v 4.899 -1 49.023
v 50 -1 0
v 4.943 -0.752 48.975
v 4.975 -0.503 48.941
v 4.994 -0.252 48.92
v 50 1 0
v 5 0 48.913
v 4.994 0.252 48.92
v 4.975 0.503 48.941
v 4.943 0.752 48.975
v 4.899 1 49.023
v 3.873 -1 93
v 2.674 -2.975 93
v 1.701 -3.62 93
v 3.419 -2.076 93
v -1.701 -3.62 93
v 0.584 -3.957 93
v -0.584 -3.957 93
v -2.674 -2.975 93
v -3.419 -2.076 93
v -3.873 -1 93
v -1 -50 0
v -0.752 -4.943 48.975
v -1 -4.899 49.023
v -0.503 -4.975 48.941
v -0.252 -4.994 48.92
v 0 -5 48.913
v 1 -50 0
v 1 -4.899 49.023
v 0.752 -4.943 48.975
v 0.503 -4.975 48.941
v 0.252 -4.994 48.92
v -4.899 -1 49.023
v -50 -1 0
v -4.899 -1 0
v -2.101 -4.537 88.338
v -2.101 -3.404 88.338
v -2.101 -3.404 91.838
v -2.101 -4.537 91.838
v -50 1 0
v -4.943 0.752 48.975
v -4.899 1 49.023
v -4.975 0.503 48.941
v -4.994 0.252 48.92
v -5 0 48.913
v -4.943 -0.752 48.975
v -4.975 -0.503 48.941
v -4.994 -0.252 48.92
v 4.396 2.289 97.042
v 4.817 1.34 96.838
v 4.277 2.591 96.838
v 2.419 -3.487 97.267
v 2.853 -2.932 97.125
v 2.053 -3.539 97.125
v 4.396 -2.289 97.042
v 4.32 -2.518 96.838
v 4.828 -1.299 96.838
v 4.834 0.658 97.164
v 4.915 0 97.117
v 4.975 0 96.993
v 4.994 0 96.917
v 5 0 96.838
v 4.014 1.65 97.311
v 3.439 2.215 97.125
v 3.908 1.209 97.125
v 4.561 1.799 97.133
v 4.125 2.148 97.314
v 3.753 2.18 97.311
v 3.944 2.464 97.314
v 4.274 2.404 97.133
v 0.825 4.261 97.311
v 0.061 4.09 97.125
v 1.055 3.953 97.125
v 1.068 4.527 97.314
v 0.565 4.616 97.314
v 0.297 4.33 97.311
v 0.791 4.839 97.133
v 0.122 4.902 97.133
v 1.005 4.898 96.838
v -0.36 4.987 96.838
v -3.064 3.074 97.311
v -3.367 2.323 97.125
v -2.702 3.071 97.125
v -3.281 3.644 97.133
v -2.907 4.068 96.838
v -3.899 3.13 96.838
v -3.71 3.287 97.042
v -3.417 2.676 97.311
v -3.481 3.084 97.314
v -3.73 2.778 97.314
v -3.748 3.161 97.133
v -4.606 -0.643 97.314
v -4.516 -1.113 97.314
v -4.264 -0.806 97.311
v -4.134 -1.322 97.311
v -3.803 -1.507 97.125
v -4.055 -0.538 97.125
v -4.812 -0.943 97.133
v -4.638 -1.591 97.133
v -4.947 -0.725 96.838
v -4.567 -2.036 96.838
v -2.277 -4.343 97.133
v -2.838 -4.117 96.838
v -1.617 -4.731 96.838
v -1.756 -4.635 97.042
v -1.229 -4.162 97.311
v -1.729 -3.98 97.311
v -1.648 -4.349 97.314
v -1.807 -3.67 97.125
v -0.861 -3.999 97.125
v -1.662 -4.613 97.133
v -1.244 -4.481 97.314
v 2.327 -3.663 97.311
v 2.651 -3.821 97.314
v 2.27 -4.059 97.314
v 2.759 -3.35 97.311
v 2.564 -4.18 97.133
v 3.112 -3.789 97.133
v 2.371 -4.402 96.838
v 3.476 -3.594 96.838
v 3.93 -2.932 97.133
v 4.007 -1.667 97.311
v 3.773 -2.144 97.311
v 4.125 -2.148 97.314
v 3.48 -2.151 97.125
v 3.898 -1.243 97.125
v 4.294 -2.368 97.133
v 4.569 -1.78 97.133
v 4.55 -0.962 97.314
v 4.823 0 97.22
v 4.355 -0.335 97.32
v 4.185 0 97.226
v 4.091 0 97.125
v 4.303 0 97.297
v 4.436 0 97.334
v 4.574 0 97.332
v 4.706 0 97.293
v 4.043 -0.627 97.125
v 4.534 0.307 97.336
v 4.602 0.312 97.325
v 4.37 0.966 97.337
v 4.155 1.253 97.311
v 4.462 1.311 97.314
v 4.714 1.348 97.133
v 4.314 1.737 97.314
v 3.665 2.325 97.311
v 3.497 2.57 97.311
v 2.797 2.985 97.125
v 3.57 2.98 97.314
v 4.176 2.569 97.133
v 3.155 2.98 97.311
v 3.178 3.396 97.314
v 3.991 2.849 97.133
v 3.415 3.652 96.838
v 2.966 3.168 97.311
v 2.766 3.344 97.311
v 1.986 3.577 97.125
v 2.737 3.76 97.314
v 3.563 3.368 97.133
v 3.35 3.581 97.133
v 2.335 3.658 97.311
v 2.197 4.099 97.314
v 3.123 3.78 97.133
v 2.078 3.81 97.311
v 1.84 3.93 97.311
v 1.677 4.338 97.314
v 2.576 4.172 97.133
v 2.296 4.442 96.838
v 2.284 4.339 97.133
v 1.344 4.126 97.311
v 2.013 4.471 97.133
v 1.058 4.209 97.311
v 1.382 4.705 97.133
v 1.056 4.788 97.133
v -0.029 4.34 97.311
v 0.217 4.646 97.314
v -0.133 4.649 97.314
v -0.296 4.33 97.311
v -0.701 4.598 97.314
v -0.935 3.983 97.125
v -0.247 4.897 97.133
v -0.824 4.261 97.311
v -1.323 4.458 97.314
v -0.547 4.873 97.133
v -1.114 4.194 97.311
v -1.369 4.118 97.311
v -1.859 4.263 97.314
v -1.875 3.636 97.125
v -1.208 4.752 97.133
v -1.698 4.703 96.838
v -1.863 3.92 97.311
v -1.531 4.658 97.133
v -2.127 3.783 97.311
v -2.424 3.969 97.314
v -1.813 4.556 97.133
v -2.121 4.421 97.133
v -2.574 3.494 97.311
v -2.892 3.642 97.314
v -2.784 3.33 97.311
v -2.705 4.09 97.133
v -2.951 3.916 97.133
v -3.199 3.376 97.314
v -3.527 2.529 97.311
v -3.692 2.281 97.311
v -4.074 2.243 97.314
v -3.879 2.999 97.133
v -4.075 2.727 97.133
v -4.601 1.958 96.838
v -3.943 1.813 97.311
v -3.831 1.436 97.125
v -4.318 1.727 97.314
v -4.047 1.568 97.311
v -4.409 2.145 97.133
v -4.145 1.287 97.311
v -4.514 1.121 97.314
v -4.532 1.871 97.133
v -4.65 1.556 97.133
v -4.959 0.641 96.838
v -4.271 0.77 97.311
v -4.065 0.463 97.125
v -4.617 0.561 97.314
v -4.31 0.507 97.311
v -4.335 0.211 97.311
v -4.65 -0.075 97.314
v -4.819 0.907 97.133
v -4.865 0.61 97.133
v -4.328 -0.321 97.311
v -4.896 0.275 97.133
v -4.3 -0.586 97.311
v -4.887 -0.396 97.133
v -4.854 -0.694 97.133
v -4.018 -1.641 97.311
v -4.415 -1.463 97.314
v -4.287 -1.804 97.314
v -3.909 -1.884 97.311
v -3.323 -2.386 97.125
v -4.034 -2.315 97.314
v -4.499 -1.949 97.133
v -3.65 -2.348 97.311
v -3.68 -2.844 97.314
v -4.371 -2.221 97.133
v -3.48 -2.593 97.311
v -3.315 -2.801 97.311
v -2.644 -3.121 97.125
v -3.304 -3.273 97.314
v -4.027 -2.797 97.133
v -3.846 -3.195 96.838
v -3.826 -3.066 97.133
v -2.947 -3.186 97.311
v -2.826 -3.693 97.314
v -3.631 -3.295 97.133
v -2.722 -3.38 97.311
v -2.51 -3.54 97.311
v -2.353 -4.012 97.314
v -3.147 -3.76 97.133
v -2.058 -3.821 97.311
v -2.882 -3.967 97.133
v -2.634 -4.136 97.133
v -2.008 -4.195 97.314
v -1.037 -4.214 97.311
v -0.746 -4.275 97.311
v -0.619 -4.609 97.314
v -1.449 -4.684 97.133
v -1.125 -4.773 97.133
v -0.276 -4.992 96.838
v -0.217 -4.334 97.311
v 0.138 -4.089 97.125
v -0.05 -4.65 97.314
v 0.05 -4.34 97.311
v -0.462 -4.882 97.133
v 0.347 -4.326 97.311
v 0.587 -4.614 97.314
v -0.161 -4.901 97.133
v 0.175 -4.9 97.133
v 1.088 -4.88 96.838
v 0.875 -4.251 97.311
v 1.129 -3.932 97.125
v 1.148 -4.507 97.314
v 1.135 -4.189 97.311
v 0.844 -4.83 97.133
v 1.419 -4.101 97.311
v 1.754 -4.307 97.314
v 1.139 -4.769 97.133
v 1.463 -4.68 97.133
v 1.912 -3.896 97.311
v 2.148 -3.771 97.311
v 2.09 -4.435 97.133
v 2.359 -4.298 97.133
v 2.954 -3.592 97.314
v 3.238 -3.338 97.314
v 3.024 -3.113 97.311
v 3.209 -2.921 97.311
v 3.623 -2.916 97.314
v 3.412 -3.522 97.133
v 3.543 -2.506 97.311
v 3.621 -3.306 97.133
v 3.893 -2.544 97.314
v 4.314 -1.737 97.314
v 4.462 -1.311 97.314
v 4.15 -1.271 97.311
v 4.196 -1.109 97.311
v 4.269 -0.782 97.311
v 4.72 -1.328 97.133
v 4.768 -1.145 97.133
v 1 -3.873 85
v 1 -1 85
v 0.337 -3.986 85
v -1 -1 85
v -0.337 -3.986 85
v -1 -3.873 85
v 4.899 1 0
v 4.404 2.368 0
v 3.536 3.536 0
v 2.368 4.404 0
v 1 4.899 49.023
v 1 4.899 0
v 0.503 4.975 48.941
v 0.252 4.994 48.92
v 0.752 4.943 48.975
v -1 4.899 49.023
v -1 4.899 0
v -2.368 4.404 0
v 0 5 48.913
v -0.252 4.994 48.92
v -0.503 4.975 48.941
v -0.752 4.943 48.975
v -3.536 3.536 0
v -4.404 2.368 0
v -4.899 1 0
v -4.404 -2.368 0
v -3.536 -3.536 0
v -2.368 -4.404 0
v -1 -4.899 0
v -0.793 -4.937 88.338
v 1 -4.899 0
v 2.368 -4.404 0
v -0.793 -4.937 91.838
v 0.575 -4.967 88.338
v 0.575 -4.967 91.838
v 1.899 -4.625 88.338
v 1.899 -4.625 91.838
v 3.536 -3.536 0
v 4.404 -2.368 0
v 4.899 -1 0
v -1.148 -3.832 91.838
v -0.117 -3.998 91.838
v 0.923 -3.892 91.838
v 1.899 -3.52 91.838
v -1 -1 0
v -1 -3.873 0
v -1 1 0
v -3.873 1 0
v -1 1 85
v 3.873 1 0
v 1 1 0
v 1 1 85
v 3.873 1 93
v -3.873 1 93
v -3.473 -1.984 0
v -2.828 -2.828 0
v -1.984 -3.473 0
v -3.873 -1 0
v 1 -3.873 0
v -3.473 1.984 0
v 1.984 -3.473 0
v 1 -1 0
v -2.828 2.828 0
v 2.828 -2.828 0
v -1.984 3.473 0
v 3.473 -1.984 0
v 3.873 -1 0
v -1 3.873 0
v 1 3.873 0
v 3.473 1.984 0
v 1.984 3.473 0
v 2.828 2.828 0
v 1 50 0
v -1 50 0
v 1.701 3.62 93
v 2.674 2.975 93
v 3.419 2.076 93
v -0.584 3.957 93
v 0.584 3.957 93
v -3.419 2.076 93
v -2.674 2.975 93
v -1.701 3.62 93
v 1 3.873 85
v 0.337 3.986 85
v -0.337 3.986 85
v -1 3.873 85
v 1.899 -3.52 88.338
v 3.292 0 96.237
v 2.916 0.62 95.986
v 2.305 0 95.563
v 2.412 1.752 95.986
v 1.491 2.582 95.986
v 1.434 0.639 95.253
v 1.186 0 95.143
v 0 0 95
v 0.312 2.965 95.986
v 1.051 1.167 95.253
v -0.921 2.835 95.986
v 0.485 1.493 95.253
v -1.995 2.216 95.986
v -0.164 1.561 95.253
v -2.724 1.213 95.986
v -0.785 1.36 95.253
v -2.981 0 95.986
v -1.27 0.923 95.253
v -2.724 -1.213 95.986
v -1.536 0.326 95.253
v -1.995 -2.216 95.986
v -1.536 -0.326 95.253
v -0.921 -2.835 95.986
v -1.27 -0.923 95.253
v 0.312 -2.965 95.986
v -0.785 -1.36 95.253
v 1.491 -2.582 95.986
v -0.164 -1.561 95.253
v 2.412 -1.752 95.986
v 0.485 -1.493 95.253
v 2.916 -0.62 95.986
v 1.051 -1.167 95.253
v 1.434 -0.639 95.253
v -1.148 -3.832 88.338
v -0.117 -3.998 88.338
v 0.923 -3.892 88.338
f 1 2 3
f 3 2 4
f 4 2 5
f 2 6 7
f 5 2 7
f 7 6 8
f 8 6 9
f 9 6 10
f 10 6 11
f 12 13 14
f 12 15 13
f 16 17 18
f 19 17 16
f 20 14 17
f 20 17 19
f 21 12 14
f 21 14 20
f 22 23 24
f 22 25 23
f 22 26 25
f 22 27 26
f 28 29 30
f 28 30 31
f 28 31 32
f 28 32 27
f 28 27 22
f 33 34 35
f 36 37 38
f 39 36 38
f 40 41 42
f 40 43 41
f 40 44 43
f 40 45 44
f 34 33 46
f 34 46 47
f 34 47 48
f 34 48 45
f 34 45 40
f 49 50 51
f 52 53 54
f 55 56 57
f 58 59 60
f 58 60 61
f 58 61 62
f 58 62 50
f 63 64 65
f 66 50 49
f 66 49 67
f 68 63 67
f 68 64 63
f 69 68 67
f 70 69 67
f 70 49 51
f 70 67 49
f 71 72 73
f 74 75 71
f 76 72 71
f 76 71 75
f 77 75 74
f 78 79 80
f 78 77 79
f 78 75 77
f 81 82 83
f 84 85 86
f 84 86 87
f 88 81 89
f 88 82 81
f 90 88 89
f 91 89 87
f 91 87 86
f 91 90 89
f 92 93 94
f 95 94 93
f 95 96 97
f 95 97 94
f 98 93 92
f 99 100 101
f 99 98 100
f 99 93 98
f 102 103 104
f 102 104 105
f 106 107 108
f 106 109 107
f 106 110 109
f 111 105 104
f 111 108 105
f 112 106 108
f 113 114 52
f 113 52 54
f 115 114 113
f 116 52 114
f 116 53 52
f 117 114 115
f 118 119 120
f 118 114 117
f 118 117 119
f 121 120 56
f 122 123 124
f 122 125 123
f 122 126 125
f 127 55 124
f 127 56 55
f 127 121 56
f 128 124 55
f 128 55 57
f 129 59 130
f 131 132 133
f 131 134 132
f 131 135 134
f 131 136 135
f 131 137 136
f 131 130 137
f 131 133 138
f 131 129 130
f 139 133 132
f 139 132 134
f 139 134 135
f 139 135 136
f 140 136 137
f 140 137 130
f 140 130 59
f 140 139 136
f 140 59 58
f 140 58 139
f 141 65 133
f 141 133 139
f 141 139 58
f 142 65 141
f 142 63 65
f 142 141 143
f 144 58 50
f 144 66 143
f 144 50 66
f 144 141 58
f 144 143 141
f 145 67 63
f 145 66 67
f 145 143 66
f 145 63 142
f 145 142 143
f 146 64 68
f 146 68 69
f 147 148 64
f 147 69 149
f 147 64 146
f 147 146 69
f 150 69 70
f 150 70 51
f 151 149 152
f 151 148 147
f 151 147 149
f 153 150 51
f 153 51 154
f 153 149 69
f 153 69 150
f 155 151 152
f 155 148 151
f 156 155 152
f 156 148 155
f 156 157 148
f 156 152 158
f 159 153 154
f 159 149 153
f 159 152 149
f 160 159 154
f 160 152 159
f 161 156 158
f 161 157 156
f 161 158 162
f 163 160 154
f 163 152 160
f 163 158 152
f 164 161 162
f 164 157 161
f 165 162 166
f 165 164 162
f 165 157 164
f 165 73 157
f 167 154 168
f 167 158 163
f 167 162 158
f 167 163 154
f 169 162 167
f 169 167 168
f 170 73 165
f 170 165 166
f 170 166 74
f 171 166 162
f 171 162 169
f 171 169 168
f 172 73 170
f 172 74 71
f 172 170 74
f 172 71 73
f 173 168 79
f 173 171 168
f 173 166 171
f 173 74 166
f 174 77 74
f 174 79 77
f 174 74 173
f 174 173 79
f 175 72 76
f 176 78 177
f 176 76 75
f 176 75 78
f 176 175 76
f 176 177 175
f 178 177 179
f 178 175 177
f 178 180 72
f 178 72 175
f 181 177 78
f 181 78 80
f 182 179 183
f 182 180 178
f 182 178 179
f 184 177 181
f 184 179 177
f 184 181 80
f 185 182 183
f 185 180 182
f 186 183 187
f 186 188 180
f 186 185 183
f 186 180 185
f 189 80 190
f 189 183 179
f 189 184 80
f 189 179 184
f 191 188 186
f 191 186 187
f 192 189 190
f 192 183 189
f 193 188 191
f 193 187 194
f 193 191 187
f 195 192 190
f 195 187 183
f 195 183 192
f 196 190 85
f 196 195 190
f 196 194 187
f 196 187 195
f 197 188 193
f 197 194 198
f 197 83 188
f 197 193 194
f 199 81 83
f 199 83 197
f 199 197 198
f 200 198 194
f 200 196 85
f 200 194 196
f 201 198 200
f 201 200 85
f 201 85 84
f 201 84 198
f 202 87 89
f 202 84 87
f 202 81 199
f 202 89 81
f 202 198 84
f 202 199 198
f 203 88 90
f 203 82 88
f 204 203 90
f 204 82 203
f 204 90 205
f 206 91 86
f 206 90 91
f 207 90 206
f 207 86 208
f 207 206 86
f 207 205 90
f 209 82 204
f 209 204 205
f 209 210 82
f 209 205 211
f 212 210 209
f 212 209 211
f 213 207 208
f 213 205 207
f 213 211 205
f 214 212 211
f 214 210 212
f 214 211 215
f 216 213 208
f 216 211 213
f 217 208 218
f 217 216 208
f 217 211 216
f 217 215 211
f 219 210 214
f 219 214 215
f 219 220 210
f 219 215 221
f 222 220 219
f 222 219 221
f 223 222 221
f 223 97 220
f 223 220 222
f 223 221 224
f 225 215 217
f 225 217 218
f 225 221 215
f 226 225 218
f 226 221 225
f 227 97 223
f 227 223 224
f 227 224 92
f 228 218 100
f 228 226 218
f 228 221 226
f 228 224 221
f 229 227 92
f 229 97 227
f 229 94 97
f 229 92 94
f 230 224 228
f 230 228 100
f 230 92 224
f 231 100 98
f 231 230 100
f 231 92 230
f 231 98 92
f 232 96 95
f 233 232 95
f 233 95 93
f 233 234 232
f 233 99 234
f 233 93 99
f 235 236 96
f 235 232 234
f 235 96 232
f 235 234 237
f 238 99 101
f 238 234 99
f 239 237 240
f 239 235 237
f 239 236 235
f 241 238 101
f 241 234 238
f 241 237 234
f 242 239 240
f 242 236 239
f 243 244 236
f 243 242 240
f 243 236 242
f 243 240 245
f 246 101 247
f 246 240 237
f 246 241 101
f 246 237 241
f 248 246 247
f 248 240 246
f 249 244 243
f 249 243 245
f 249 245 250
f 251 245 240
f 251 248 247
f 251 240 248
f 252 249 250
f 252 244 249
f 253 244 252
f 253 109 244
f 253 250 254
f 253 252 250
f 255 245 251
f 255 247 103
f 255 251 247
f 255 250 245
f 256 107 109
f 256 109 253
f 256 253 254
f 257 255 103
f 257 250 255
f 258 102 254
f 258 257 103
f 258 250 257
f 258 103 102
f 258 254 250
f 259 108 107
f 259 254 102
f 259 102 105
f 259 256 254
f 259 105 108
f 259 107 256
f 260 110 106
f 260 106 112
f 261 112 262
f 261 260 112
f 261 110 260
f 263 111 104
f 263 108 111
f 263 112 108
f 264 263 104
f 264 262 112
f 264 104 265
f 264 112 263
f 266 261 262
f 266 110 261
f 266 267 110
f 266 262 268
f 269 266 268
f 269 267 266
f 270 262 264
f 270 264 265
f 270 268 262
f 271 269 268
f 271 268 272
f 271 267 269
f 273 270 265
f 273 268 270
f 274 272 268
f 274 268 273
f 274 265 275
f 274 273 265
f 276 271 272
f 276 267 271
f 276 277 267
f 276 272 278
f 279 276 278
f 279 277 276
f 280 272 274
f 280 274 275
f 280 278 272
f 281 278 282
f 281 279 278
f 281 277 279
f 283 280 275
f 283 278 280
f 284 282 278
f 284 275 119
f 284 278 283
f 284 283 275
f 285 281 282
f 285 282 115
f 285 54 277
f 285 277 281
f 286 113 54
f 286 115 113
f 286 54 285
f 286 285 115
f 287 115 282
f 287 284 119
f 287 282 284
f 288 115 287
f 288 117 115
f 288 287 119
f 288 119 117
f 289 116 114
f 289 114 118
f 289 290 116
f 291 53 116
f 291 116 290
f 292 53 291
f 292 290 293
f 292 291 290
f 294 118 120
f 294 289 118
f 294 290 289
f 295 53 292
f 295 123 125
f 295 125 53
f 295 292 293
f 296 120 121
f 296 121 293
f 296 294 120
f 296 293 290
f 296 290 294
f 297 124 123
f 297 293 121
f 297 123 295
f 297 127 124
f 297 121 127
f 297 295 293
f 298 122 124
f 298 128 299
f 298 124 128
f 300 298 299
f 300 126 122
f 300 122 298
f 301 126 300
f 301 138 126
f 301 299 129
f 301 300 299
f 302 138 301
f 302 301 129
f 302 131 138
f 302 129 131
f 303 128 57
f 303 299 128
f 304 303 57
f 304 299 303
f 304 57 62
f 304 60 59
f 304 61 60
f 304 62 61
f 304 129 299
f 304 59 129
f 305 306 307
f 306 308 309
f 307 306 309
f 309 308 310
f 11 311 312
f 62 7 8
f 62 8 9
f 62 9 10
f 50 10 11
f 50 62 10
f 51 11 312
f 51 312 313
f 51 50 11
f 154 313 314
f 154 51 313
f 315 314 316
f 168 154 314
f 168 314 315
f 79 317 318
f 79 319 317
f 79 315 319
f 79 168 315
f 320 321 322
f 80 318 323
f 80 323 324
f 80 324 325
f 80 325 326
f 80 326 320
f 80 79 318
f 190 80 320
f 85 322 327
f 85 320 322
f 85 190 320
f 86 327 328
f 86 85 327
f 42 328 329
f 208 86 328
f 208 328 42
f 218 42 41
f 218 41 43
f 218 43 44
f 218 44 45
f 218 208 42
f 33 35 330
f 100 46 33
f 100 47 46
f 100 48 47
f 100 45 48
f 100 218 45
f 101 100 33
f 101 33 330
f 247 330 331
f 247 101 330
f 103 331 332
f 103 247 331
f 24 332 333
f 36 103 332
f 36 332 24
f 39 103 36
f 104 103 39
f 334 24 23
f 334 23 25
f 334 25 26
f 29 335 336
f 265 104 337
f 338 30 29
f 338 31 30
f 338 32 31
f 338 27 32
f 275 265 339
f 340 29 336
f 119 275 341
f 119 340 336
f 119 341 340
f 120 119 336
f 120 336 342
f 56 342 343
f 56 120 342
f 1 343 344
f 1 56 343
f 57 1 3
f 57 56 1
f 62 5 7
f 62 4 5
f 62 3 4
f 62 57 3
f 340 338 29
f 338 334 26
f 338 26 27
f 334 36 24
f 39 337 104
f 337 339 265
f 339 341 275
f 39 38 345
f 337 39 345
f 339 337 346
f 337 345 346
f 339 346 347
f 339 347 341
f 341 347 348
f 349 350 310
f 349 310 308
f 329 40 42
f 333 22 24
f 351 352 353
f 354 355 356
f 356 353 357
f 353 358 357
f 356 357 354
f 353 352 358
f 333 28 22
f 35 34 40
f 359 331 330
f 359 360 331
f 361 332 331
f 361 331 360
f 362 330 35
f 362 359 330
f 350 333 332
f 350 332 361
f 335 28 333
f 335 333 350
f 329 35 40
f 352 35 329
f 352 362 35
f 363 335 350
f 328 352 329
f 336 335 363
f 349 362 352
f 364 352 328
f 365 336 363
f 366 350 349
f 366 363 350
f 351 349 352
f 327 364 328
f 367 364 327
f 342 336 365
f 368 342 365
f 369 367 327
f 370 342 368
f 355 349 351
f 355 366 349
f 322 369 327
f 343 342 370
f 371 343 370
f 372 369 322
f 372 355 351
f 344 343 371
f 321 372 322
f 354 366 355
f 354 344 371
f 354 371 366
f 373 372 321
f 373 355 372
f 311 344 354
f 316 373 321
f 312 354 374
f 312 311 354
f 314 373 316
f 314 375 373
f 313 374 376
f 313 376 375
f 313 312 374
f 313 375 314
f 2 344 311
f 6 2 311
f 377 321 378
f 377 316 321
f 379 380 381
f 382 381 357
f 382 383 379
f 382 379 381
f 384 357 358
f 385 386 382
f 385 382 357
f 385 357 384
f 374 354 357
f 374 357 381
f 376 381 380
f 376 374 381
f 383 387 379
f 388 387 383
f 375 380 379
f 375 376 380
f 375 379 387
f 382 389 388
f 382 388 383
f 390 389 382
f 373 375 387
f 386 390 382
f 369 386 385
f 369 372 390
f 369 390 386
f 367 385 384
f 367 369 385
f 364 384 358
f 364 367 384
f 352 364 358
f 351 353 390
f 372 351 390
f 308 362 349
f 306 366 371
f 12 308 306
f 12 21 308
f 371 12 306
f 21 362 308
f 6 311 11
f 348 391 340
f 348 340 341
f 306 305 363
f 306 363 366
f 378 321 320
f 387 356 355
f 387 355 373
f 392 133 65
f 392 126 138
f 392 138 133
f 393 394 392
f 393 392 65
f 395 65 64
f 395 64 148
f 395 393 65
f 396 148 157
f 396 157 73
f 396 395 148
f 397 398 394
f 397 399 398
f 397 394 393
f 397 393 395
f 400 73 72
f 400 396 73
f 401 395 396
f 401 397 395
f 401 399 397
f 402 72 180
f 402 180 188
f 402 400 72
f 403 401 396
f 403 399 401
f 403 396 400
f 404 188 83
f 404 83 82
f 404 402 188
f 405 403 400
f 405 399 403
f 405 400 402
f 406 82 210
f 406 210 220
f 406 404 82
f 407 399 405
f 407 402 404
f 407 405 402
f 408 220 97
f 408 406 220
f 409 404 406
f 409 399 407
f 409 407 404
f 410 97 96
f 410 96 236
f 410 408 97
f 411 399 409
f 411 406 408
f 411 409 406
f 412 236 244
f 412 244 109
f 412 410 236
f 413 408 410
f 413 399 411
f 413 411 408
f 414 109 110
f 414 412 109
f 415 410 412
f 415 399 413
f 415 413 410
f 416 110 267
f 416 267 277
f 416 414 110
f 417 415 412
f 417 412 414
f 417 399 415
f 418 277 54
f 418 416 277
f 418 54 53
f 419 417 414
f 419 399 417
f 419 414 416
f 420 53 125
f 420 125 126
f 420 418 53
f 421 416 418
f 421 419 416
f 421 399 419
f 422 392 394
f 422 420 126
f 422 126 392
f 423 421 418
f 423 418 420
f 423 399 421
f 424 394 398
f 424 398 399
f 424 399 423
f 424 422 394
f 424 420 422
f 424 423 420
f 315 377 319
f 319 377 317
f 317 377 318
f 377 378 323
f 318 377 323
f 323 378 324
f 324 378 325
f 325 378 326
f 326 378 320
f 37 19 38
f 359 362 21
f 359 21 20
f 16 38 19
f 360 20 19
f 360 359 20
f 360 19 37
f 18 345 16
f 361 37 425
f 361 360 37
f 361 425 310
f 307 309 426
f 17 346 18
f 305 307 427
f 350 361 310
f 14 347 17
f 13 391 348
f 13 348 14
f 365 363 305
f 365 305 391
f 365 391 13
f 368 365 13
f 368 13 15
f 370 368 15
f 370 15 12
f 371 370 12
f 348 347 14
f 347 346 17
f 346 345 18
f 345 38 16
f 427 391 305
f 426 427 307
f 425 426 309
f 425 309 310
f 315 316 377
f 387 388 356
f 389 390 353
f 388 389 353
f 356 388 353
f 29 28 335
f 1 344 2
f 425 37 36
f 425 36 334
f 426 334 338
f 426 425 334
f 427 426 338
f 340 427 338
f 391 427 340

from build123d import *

# Parameters (mm, degrees)
F1_R          = 0.5
F3_DEPTH      = 1
F3_DEPTH_BACK = 1
F5_DEPTH      = 1
F5_DEPTH_BACK = 1
F7_START      = 1
F6_W          = 4
F6_H          = 3.5
F7_DEPTH      = 4


with BuildPart() as f0:
    # F8 (on Front) → F0 (revolve)
    with BuildSketch(Plane.XZ):
        with BuildLine():
            ThreePointArc((5, 100), (3.5355339059, 96.4644660941), (0, 95))
            Line((0, 95), (0, 93))
            Line((0, 93), (4, 93))
            Line((4, 93), (4, 0))
            Line((4, 0), (5, 0))
            Line((5, 0), (5, 100))
        make_face()
    revolve(axis=Axis((0, 0, 94), (0, 0, 1)))

    # F1
    f1_edges = [f0.edges().sort_by_distance(p)[0] for p in [
        (-5, 0, 100),
    ]]
    fillet(f1_edges, radius=F1_R)

    # F2 (on Front) → F3 (join, two sides)
    with BuildSketch(Plane.XZ) as f3_sk:
        Polygon((-50, 0), (50, 0), (4, 50), (4, 95), (-4, 95), (-4, 50), align=None)
    extrude(amount=F3_DEPTH)
    extrude(f3_sk.sketch, amount=-F3_DEPTH_BACK)

    # F4 (on Right) → F5 (join, two sides)
    with BuildSketch(Plane.YZ) as f5_sk:
        Polygon((-50, 0), (50, 0), (4, 50), (4, 85), (-4, 85), (-4, 50), align=None)
    extrude(amount=F5_DEPTH)
    extrude(f5_sk.sketch, amount=-F5_DEPTH_BACK)

    # F6 (on Front) → F7 (cut)
    with BuildSketch(Plane.XZ.offset(F7_START)):
        with Locations((-0.1010205144, 90.0877223398)):
            Rectangle(F6_W, F6_H)
    extrude(amount=F7_DEPTH, mode=Mode.SUBTRACT)


solid = f0.part
